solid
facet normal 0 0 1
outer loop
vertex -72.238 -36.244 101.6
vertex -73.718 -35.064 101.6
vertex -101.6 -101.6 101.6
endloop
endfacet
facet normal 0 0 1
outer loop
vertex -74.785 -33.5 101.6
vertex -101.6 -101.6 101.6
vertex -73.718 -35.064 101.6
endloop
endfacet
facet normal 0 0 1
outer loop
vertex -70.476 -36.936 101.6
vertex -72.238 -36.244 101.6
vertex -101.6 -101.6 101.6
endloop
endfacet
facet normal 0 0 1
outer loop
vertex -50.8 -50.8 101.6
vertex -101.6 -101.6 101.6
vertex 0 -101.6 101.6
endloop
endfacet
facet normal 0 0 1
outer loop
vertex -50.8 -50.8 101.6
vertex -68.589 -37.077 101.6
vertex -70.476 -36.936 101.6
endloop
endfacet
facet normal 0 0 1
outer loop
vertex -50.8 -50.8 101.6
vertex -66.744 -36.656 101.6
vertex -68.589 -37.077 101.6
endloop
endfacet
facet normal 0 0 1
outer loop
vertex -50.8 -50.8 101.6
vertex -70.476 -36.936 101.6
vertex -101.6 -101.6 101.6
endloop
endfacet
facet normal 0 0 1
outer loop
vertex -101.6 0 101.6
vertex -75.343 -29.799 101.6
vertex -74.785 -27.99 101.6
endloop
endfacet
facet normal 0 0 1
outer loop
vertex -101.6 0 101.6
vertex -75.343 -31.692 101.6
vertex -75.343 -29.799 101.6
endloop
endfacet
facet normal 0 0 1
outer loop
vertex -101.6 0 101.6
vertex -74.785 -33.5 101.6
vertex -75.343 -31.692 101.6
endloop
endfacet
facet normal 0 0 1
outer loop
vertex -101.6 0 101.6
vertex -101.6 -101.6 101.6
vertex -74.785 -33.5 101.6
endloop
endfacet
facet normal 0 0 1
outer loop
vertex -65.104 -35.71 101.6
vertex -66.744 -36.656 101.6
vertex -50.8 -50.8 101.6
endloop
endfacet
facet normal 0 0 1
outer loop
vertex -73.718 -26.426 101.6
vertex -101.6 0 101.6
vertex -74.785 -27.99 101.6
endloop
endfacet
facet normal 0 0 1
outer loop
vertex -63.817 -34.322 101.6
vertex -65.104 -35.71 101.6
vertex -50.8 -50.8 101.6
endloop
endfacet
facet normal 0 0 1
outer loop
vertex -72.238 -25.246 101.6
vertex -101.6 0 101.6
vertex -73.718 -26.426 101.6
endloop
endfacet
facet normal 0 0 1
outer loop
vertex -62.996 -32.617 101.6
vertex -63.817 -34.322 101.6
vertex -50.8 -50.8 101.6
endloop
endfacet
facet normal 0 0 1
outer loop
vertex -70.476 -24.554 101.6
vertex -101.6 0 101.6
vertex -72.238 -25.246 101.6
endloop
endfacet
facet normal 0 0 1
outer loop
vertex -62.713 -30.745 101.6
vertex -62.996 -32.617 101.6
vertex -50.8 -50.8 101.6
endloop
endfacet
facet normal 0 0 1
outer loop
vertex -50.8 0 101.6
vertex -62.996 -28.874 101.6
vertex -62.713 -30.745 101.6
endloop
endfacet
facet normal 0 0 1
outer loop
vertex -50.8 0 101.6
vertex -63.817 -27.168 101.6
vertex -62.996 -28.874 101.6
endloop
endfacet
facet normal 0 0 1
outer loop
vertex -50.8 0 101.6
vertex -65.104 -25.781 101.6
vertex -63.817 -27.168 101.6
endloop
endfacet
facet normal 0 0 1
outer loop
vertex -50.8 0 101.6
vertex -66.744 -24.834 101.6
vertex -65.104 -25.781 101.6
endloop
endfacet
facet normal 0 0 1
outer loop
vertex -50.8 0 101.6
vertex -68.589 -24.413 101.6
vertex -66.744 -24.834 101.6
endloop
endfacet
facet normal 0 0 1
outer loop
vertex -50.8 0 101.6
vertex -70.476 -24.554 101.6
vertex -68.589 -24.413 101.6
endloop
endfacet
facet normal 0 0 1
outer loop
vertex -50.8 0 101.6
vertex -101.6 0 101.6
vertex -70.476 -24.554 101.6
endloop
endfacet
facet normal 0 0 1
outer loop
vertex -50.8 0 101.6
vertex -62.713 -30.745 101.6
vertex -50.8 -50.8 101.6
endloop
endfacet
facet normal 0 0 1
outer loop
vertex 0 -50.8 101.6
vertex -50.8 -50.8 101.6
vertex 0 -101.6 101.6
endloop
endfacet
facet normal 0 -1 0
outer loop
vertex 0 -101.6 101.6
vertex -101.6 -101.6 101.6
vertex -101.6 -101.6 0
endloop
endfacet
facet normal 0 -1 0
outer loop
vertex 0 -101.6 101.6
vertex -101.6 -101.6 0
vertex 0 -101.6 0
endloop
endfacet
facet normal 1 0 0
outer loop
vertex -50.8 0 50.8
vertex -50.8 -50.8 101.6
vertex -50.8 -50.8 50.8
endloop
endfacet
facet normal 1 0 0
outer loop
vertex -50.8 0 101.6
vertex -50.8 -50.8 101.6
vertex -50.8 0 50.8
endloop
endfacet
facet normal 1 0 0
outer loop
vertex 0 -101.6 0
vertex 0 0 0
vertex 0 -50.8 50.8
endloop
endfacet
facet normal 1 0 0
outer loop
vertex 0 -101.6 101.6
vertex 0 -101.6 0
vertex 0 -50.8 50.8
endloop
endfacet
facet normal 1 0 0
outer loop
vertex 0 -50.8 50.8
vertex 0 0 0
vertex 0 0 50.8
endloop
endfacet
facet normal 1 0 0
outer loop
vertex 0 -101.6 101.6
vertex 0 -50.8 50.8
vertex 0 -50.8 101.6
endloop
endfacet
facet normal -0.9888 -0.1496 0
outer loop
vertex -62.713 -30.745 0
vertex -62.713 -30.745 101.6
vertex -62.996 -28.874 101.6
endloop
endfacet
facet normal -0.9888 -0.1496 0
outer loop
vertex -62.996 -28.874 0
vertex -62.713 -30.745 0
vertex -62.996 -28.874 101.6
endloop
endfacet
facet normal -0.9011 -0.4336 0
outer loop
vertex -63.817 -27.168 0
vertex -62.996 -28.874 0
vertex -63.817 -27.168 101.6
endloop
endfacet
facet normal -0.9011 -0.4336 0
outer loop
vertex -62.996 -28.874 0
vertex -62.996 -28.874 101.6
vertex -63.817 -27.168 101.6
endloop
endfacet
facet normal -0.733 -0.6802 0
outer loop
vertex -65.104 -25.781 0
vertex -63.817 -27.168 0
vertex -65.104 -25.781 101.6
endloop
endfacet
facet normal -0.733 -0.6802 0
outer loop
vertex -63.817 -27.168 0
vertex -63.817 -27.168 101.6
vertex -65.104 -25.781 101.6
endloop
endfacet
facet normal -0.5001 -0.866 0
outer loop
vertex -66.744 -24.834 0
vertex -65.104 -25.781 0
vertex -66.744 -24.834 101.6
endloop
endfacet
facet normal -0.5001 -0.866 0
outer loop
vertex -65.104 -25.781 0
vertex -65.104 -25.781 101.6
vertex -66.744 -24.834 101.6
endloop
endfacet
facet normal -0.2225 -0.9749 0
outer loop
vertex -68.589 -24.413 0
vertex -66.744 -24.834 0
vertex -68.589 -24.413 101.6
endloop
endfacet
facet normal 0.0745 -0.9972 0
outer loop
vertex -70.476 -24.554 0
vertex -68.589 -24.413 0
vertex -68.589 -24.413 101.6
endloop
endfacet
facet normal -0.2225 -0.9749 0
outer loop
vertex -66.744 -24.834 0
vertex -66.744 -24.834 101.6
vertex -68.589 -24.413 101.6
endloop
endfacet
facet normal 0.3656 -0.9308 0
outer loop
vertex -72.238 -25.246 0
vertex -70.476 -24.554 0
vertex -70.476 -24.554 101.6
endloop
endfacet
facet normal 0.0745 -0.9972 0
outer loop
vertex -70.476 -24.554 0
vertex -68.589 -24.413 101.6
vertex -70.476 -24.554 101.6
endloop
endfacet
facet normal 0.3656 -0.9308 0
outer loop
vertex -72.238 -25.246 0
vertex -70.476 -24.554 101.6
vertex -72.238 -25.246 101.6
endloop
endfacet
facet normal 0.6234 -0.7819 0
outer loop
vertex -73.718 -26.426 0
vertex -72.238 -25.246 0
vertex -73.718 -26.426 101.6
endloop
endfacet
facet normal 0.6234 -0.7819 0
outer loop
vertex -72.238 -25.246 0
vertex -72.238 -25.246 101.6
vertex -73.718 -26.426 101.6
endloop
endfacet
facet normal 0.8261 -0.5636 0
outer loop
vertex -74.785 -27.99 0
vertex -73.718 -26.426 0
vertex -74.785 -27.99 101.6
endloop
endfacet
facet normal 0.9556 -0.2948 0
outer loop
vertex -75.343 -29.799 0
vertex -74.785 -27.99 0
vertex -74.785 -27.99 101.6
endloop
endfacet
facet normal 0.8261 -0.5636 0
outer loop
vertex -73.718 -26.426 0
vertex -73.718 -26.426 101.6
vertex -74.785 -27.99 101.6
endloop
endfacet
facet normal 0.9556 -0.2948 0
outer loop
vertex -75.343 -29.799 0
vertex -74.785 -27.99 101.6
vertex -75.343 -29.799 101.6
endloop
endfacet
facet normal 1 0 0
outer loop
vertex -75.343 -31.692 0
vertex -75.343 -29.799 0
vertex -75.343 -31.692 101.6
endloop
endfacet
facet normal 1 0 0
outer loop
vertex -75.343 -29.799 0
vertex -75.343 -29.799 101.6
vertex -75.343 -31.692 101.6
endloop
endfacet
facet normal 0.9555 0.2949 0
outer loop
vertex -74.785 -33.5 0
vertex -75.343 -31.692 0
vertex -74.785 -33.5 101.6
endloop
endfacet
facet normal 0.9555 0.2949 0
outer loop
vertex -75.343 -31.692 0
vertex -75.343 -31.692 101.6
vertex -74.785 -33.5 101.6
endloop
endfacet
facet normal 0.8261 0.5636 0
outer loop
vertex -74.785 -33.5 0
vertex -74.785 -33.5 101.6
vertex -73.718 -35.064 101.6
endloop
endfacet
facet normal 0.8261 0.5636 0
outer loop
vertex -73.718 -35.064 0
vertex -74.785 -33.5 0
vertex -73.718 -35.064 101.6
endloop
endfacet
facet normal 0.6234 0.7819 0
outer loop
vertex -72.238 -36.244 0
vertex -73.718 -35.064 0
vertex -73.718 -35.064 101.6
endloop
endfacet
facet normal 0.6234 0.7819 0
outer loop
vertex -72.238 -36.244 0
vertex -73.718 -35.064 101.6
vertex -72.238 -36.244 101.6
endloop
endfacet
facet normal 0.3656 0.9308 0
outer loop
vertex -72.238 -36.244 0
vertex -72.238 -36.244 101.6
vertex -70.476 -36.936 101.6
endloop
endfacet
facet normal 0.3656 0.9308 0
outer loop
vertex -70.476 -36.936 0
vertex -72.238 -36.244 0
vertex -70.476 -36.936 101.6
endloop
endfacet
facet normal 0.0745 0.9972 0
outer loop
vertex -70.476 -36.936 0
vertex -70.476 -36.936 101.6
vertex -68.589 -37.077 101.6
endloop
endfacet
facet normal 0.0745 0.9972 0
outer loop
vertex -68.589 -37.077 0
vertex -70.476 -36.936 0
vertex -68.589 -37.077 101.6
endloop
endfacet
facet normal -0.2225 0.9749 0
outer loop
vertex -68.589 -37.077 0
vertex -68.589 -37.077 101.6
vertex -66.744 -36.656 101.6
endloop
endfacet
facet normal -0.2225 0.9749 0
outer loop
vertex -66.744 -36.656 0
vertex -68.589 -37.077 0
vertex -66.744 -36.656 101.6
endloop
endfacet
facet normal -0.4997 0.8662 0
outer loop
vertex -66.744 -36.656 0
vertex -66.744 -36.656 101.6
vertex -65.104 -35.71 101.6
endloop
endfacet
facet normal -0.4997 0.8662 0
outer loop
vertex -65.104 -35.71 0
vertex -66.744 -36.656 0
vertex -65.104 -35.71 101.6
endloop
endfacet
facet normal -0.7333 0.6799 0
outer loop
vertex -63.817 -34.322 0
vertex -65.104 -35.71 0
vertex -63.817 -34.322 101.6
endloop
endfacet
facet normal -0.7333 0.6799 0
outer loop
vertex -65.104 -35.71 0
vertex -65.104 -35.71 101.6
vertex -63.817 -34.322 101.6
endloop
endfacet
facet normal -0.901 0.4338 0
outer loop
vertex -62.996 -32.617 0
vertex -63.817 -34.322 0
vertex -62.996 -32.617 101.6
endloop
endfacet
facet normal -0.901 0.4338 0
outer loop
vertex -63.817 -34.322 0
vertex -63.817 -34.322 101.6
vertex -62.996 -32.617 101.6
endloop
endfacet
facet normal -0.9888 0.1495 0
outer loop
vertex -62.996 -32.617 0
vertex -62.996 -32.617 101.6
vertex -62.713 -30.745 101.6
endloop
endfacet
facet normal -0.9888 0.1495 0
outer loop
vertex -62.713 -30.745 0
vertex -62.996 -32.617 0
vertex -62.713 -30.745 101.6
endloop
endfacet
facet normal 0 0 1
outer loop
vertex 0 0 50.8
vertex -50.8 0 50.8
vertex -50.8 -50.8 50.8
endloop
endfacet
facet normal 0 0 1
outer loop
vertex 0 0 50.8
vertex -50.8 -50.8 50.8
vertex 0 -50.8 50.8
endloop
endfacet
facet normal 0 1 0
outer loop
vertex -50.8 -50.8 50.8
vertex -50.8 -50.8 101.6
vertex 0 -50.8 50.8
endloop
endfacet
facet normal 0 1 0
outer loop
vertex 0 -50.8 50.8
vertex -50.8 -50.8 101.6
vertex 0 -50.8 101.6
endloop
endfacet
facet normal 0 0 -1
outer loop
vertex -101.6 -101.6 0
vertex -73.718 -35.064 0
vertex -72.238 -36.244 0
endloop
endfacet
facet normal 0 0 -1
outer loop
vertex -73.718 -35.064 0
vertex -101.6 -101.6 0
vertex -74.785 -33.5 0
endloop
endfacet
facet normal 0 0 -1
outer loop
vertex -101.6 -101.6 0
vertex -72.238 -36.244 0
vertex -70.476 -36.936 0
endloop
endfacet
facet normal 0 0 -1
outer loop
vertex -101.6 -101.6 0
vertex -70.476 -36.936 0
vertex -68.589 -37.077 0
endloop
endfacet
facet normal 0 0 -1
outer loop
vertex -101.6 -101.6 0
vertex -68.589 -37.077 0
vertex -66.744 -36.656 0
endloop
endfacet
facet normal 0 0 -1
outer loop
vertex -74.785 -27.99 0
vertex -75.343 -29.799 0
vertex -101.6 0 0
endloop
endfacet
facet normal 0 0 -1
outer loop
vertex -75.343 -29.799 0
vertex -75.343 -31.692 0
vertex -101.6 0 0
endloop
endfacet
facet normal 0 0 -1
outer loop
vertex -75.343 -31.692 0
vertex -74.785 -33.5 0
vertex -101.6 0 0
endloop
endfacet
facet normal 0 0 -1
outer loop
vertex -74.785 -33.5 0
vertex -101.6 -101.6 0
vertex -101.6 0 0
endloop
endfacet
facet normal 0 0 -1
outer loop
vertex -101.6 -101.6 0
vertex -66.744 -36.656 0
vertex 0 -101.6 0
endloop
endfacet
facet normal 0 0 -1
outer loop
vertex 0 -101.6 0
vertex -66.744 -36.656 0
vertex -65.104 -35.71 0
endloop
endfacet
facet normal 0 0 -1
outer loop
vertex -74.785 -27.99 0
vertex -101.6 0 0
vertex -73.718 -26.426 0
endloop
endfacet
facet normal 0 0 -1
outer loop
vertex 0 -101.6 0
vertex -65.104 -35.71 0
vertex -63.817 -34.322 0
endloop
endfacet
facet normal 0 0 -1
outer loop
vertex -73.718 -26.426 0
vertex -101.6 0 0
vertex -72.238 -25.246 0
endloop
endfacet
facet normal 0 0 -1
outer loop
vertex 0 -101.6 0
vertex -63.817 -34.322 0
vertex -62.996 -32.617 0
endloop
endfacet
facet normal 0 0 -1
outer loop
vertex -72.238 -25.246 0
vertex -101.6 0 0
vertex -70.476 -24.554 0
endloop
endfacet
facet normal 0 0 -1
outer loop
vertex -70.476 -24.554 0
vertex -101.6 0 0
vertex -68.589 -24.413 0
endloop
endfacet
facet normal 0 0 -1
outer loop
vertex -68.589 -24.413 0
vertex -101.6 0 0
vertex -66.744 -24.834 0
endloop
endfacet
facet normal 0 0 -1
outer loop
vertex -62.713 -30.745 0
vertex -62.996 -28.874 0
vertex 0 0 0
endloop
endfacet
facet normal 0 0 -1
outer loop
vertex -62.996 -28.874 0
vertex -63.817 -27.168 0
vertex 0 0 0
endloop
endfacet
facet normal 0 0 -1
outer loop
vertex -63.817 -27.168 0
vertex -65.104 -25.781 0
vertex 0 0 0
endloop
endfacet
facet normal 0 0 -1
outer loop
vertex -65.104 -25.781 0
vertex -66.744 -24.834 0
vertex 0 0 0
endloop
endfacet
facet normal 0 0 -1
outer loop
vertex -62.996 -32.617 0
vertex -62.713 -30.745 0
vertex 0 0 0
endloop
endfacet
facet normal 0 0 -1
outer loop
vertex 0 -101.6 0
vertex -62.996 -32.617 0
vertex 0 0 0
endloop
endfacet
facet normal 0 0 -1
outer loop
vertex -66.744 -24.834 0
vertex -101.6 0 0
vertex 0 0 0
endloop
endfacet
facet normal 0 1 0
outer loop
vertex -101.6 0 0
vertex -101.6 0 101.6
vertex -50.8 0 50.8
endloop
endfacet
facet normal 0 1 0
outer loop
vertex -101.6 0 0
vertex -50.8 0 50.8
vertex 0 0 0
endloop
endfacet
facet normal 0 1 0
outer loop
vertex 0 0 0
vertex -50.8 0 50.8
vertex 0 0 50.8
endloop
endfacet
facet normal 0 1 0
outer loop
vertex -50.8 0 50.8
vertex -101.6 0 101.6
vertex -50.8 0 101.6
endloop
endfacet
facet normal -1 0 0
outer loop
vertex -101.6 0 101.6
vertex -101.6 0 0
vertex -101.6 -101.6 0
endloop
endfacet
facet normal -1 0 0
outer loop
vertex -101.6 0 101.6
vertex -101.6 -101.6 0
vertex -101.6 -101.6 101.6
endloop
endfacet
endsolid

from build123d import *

# Parameters (mm, degrees)
F0_W     = 101.6
F0_H     = 101.6
F1_DEPTH = 101.6
F2_R     = 6.35
F3_DEPTH = 101.6
F4_W     = 50.8
F4_H     = 50.8
F5_DEPTH = 50.8


with BuildPart() as f1:
    # F0 (on Front) → F1 (new body)
    with BuildSketch(Plane.XZ):
        with Locations((-50.8, 50.8)):
            Rectangle(F0_W, F0_H)
    extrude(amount=F1_DEPTH)

    # F2 (on face) → F3 (cut)
    with BuildSketch(Plane.XY.offset(101.6)):
        with Locations((-69.063447, -30.745214)):
            Circle(F2_R)
    extrude(amount=-F3_DEPTH, mode=Mode.SUBTRACT)

    # F4 (on face) → F5 (cut)
    with BuildSketch(Plane.XY.offset(101.6)):
        with Locations((-25.4, -25.4)):
            Rectangle(F4_W, F4_H)
    extrude(amount=-F5_DEPTH, mode=Mode.SUBTRACT)


solid = f1.part
